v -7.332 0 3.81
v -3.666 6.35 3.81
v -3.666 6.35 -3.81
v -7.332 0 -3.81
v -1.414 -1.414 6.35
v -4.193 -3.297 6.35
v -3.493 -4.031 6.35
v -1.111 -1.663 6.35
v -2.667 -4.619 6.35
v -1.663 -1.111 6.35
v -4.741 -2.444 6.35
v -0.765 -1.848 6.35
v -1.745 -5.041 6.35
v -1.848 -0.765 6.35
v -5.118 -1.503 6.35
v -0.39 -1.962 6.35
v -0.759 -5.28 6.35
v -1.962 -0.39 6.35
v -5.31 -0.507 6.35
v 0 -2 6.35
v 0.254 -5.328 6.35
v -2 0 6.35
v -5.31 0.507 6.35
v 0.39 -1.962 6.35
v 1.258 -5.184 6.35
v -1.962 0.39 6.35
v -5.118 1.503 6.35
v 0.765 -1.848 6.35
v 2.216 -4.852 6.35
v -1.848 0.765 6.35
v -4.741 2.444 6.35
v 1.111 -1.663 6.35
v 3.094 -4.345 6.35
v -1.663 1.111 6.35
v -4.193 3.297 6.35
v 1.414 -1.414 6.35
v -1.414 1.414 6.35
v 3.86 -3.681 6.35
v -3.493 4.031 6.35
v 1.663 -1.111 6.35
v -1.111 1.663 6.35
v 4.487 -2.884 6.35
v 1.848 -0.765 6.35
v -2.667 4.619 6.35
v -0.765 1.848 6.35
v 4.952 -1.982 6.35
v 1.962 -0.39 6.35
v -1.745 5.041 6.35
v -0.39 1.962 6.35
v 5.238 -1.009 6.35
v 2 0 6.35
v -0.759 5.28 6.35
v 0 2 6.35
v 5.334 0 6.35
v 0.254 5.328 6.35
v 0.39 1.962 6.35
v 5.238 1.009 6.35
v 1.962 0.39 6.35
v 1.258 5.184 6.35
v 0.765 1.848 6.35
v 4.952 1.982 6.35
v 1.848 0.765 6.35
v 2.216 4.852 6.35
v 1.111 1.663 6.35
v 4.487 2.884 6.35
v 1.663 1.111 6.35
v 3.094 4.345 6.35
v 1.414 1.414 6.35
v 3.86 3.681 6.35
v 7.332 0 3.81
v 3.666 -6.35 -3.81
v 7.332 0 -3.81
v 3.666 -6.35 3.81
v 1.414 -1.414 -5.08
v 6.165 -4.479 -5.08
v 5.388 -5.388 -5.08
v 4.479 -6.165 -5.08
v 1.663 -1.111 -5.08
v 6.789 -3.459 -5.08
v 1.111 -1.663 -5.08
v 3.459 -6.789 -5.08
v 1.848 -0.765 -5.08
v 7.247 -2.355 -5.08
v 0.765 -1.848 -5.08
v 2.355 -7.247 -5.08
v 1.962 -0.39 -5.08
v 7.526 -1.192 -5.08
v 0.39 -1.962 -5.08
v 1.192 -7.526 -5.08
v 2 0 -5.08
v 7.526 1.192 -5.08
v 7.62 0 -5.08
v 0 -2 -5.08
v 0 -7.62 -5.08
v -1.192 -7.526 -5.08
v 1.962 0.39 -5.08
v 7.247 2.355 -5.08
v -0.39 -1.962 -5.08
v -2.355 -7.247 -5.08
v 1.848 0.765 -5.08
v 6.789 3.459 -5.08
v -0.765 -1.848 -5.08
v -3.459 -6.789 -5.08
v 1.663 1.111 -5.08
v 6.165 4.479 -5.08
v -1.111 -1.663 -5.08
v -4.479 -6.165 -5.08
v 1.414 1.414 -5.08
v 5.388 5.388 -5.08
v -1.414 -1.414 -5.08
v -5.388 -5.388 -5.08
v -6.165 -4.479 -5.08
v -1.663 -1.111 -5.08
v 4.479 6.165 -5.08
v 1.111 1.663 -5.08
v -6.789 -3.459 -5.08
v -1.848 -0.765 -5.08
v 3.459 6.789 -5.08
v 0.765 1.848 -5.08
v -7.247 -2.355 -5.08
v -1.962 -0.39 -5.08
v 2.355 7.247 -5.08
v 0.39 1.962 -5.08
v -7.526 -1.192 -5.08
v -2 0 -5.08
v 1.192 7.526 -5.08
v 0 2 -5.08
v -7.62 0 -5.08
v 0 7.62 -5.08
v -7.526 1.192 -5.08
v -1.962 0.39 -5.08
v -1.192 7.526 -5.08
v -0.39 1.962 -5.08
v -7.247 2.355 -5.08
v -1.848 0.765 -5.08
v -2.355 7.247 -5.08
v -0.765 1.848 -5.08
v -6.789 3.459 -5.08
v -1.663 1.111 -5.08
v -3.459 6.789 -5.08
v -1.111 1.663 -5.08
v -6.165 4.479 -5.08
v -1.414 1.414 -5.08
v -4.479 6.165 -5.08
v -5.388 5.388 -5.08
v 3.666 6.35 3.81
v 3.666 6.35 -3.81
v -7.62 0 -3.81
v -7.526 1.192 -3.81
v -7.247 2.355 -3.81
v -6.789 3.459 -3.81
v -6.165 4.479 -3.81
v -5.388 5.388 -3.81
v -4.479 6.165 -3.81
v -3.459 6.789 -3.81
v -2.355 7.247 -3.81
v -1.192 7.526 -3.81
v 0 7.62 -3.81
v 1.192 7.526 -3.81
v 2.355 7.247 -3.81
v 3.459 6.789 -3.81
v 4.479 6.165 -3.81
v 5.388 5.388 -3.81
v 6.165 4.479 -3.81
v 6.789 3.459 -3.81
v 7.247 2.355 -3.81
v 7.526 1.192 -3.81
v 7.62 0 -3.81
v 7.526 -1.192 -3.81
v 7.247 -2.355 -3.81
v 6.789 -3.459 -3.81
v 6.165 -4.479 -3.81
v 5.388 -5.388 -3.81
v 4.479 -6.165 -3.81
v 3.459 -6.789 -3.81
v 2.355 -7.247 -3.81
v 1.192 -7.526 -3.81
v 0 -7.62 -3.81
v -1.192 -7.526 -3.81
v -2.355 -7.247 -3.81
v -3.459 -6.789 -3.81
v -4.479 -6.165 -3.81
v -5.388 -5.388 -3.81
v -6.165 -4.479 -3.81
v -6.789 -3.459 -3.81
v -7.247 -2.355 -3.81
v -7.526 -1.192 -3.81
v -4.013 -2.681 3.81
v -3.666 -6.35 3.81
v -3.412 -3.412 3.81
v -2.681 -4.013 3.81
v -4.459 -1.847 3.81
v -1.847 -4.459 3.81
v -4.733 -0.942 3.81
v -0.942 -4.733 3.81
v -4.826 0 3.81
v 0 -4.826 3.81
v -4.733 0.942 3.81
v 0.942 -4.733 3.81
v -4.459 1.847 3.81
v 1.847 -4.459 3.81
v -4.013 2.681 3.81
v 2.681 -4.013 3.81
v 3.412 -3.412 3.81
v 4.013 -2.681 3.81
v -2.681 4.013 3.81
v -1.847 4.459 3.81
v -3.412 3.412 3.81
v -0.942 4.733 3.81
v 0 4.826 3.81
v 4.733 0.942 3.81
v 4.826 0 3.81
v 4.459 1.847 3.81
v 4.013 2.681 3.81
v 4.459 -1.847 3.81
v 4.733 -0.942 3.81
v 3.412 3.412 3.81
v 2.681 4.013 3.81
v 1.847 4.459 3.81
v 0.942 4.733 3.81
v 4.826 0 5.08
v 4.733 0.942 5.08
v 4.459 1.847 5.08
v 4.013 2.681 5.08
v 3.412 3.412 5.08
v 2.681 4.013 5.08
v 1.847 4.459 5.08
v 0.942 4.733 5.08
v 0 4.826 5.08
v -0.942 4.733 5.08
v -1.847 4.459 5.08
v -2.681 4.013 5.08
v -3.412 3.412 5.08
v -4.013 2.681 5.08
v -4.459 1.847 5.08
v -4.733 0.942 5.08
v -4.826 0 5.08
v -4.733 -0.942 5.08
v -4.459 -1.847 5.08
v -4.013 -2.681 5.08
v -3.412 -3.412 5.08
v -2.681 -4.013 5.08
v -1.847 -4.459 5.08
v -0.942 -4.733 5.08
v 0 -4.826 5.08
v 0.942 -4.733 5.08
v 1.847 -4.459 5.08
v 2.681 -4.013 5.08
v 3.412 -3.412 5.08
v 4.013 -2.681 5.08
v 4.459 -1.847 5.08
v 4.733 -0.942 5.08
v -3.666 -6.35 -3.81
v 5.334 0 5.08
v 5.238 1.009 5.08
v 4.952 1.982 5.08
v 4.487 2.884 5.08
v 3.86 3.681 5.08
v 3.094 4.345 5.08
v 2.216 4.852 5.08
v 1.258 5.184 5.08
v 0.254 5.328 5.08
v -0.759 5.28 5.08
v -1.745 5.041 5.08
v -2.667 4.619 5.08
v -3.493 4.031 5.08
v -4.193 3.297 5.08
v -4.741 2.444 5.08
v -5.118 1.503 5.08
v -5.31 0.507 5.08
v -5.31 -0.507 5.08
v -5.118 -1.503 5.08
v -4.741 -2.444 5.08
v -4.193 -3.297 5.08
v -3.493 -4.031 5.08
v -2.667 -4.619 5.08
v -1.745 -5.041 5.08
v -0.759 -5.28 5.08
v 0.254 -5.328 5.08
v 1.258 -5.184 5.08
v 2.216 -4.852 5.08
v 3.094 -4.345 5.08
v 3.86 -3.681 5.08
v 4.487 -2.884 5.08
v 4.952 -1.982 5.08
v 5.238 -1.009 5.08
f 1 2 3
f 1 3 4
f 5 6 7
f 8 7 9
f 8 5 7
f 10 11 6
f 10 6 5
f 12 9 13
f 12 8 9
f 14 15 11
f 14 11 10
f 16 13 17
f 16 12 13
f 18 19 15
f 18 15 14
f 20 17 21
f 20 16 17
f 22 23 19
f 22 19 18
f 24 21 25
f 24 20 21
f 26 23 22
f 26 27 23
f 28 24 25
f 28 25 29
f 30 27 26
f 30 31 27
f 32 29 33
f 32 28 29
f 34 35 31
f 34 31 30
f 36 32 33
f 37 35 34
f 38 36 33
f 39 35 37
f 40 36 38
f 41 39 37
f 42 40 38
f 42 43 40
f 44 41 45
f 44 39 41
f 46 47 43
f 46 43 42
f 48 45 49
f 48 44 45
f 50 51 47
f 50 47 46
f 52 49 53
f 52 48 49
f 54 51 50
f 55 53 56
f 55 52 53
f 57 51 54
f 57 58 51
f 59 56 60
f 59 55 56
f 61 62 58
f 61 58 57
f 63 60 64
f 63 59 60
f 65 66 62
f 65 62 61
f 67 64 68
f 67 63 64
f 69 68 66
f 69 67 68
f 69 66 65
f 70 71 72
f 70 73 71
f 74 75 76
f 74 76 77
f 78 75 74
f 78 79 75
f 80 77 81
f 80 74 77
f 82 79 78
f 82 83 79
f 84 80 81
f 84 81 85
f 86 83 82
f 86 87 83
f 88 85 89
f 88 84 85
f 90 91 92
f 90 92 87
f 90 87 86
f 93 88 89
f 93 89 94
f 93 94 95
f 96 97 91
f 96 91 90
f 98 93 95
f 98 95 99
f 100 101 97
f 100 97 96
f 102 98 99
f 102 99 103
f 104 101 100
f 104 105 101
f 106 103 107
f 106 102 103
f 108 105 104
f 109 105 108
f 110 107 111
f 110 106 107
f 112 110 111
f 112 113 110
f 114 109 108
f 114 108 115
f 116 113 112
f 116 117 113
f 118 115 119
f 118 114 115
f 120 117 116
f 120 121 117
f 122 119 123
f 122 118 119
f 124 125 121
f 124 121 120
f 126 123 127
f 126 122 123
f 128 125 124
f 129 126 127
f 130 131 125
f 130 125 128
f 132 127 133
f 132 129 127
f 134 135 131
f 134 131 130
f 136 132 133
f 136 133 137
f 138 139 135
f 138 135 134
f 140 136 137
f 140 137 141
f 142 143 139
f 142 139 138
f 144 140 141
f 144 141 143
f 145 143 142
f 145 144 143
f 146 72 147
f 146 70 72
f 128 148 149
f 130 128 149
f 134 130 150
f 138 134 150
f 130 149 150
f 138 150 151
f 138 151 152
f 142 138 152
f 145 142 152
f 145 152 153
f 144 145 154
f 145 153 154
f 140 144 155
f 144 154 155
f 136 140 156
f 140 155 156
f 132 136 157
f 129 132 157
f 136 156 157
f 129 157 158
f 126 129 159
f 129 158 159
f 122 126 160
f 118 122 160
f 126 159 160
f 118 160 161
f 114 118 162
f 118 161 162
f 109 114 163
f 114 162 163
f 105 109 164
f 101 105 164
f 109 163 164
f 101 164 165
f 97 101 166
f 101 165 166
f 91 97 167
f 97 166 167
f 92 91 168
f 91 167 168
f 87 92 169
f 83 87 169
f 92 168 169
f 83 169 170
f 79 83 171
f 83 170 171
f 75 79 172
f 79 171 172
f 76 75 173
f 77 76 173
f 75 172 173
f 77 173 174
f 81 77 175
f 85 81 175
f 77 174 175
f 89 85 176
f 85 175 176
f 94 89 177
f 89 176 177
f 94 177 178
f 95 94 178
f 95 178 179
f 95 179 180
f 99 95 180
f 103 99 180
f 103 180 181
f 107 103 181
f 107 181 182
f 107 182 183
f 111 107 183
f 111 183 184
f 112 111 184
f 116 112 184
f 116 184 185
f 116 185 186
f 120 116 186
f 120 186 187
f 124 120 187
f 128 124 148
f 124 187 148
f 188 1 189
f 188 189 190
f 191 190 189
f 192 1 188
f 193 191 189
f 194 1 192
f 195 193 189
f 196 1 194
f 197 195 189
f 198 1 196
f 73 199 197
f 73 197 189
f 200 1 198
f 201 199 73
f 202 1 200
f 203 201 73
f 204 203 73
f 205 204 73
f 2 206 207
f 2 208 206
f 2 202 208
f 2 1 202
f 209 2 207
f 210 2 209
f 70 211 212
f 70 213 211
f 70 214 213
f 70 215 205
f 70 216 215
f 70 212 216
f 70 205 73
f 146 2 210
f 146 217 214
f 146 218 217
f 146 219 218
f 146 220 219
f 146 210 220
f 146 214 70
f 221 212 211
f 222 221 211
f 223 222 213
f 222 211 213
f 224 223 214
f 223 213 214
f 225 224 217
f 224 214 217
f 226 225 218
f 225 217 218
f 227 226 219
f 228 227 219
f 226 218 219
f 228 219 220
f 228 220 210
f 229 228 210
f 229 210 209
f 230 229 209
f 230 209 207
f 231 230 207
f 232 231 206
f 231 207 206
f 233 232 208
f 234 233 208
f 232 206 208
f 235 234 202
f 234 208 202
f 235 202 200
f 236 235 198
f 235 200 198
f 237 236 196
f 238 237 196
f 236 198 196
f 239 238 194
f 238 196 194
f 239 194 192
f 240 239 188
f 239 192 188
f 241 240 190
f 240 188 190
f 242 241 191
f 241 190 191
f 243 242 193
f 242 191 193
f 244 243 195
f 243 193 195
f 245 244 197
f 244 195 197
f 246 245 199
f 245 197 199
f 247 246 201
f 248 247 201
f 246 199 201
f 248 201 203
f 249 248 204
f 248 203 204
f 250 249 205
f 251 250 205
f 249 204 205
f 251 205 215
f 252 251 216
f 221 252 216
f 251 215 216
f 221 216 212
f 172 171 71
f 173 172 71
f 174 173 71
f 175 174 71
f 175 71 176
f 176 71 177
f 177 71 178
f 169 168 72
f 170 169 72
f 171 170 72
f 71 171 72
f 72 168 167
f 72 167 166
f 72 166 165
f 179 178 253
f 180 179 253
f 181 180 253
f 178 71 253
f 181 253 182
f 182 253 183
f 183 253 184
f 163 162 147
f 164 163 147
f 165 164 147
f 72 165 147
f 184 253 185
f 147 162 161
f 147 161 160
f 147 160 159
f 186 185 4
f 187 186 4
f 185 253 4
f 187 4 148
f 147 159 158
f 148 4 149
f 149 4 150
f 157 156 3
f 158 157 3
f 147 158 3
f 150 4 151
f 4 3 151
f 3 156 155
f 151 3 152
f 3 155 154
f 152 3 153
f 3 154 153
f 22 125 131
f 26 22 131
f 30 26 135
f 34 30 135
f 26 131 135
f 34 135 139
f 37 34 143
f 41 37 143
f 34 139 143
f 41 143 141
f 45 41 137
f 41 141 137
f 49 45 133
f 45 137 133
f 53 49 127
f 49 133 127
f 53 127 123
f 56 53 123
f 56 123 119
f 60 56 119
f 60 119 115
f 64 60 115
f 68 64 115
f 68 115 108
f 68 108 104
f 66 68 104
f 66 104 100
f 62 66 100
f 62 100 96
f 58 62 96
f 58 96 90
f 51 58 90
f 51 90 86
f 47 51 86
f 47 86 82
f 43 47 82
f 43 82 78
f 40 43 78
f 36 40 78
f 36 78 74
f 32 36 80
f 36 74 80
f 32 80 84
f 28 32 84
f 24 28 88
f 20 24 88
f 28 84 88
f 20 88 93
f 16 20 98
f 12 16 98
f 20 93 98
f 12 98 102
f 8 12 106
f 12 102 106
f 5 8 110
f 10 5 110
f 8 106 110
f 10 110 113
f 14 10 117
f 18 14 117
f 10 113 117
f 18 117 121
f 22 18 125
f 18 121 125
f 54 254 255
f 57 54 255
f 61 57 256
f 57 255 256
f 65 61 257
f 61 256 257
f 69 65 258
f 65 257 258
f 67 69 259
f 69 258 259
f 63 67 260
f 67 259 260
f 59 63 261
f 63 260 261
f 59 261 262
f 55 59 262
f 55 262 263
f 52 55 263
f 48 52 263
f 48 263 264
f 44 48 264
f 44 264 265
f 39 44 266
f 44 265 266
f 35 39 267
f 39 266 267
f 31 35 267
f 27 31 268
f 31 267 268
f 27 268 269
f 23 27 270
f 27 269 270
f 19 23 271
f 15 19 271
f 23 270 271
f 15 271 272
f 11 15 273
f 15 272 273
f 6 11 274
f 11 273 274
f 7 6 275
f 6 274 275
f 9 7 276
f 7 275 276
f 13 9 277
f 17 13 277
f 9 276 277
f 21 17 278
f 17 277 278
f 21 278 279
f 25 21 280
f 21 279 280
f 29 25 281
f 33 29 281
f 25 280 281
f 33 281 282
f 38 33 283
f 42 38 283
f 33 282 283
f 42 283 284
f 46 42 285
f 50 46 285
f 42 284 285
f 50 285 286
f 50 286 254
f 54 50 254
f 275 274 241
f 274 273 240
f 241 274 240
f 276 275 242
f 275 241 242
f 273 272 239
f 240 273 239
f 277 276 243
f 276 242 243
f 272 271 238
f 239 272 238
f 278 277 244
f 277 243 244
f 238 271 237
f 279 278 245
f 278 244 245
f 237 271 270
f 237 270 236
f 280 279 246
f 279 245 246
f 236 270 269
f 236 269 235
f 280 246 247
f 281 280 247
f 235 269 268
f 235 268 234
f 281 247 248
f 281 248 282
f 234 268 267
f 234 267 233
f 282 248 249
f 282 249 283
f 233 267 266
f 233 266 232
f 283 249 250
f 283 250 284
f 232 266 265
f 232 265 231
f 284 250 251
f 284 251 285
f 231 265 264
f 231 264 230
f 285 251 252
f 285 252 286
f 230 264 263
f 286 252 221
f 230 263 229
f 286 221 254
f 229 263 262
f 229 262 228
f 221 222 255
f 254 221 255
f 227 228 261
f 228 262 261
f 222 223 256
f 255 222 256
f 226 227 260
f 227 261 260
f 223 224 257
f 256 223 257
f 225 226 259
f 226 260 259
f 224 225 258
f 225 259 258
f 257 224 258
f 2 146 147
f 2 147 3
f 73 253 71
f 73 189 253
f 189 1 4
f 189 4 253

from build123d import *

# Parameters (mm, degrees)
BOSS_EXTRU_1_DEPTH      = 3.81
ESQUISSE2_R             = 7.62
BOSS_EXTRU_2_DEPTH      = 1.27
ESQUISSE3_R             = 4.826
BOSS_EXTRU_3_DEPTH      = 1.27
ESQUISSE4_R             = 5.334
BOSS_EXTRU_4_DEPTH      = 1.27
ESQUISSE5_R             = 2
ENL_V_MAT_EXTRU_1_DEPTH = 12.43


with BuildPart() as part:
    # Esquisse1 → Boss.-Extru.1 (new body, symmetric)
    with BuildSketch(Plane.XY):
        Polygon((7.332348419, 0), (3.666174209, 6.35), (-3.666174209, 6.35), (-7.332348419, 0), (-3.666174209, -6.35), (3.666174209, -6.35), align=None)
    extrude(amount=BOSS_EXTRU_1_DEPTH, both=True)

    # Esquisse2 → Boss.-Extru.2 (add)
    with BuildSketch(Plane(origin=(0, 0, -3.81), x_dir=(-1, 0, 0), z_dir=(0, 0, -1))):
        Circle(ESQUISSE2_R)
    extrude(amount=BOSS_EXTRU_2_DEPTH)

    # Esquisse3 → Boss.-Extru.3 (add)
    with BuildSketch(Plane.XY.offset(3.81)):
        Circle(ESQUISSE3_R)
    extrude(amount=BOSS_EXTRU_3_DEPTH)

    # Esquisse4 → Boss.-Extru.4 (add)
    with BuildSketch(Plane.XY.offset(5.08)):
        Circle(ESQUISSE4_R)
    extrude(amount=BOSS_EXTRU_4_DEPTH)

    # Esquisse5 → Enlèv. mat.-Extru.1 (cut, through all)
    with BuildSketch(Plane(origin=(0, 0, -5.08), x_dir=(-1, 0, 0), z_dir=(0, 0, -1))):
        Circle(ESQUISSE5_R)
    extrude(amount=-ENL_V_MAT_EXTRU_1_DEPTH, mode=Mode.SUBTRACT)


solid = part.part
